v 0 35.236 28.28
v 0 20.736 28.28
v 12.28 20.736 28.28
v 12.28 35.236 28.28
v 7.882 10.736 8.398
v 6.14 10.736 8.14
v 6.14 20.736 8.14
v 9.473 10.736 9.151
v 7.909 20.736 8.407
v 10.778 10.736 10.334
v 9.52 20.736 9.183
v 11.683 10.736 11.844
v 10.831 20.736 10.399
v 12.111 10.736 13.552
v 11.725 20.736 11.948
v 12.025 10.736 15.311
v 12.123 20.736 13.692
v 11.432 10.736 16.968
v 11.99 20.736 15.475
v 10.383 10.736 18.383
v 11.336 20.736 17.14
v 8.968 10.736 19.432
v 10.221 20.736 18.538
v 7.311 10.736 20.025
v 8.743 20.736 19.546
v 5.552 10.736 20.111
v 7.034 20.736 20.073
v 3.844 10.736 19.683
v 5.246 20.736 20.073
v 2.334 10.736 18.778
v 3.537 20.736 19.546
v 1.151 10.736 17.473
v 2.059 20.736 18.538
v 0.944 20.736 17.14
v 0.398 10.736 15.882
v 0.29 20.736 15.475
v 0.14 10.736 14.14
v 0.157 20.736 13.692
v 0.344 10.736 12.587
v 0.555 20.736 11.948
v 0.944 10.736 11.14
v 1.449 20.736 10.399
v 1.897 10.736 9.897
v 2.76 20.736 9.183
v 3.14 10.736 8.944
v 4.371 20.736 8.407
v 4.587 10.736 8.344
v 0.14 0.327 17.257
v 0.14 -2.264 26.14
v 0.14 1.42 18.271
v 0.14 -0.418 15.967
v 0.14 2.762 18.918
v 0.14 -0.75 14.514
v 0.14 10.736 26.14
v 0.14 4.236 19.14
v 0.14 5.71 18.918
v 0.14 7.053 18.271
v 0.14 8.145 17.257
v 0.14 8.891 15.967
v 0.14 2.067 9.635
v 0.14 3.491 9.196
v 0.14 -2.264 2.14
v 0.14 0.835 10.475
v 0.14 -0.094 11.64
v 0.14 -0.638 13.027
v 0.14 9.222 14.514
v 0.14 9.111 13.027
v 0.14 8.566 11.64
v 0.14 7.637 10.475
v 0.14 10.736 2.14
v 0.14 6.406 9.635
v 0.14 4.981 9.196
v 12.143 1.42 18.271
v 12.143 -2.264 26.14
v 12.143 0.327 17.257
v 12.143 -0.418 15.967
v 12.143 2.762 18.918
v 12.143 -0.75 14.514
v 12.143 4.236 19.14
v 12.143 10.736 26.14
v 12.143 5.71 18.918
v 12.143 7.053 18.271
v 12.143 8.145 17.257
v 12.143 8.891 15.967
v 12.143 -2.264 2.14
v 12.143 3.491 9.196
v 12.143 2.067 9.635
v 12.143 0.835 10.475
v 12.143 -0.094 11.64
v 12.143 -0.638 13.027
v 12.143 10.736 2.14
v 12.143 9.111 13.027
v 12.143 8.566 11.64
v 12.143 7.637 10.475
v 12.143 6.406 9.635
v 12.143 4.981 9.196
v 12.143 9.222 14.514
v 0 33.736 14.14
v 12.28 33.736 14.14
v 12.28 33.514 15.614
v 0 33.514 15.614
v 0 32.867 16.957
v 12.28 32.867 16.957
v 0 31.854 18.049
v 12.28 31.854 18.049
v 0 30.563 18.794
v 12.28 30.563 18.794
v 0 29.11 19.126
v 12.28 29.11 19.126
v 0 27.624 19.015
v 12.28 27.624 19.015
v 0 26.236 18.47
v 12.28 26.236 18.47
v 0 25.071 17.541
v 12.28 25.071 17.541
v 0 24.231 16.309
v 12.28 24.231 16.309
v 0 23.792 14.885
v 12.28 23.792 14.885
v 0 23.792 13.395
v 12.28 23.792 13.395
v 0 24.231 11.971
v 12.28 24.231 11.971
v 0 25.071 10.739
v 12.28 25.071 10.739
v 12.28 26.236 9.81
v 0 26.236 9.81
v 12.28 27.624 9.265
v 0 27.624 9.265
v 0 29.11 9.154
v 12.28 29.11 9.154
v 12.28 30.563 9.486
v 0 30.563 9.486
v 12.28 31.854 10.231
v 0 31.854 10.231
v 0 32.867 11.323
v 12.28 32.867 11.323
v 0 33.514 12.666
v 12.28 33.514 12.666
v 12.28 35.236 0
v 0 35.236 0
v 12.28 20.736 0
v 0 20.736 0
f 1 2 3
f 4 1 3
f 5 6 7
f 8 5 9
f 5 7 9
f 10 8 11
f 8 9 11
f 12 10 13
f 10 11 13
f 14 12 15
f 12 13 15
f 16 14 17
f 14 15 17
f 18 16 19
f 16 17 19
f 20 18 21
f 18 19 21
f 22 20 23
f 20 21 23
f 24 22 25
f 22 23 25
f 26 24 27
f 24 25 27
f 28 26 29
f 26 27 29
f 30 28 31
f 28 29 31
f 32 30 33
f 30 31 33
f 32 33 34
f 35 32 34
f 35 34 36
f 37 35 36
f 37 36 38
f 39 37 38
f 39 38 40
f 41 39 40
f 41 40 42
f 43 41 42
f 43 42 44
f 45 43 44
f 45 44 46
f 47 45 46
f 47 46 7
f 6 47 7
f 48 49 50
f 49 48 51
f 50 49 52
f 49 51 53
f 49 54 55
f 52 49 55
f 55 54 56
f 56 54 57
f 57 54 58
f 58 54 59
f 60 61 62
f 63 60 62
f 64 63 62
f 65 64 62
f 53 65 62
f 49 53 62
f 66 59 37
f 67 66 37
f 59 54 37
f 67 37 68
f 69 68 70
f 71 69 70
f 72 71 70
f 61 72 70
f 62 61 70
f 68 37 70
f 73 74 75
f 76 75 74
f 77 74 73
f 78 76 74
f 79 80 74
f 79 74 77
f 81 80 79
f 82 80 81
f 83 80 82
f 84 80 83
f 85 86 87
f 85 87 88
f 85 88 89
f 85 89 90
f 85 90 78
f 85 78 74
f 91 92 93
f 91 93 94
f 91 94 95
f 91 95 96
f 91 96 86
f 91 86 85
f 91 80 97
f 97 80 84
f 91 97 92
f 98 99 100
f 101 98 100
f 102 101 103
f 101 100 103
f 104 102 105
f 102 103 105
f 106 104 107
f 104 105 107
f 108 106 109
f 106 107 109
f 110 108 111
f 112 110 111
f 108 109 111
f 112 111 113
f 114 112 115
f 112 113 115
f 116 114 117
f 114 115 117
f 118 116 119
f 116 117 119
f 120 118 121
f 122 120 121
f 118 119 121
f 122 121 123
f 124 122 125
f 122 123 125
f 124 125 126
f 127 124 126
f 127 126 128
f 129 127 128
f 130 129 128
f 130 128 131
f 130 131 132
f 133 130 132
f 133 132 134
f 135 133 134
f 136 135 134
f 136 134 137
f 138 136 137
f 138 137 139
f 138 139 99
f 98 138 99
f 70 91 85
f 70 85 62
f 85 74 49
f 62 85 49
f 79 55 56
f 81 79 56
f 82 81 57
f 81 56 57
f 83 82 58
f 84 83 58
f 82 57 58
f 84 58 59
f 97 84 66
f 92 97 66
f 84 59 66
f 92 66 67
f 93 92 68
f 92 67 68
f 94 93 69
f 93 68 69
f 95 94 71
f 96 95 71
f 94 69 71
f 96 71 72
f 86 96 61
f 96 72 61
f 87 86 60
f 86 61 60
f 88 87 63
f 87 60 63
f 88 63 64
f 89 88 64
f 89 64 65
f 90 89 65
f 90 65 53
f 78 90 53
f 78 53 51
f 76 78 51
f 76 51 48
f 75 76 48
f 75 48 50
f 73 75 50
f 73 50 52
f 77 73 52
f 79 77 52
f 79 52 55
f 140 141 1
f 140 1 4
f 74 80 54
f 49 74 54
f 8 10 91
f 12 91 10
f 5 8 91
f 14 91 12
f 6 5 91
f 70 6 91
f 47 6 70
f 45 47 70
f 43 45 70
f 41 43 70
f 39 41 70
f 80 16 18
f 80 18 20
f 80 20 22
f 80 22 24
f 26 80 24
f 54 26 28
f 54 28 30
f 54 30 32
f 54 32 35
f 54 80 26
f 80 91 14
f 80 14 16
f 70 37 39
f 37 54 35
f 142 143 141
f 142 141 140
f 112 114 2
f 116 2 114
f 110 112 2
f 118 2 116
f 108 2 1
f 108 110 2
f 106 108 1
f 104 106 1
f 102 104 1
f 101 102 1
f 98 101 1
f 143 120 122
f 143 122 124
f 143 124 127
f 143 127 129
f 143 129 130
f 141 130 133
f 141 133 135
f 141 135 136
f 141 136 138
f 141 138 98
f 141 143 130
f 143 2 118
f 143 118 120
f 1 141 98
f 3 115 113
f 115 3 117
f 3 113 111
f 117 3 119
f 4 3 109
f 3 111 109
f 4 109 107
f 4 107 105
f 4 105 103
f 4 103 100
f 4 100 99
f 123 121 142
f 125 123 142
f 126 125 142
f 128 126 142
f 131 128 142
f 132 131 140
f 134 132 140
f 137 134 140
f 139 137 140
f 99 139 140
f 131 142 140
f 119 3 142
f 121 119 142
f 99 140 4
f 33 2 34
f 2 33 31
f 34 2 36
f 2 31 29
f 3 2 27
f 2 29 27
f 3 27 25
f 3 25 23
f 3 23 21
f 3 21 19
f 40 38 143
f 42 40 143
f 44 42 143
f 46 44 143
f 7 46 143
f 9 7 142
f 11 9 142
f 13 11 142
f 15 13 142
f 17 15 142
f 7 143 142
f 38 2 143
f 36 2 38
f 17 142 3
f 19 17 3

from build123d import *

# Parameters (mm, degrees)
SKETCH1_W           = 12.28
SKETCH1_H           = 14.5
BOSS_EXTRUDE1_DEPTH = 28.28
SKETCH2_R           = 5
CUT_EXTRUDE1_DEPTH  = 28.27
SKETCH3_R           = 6
BOSS_EXTRUDE2_DEPTH = 10
SKETCH4_R           = 6
BOSS_EXTRUDE3_DEPTH = 13
SKETCH5_R           = 5
CUT_EXTRUDE2_DEPTH  = 13


with BuildPart() as part:
    # Sketch1 → Boss-Extrude1 (new body)
    with BuildSketch(Plane.XY):
        with Locations((6.14, 27.98627451)):
            Rectangle(SKETCH1_W, SKETCH1_H)
    extrude(amount=BOSS_EXTRUDE1_DEPTH)

    # Sketch2 → Cut-Extrude1 (cut)
    with BuildSketch(Plane(origin=(12.28, 0, 0), x_dir=(0, 0, -1), z_dir=(1, 0, 0))):
        with Locations(Location((-14.14, 28.73627451, 0), (0, 0, 90))):
            Circle(SKETCH2_R)
    extrude(amount=-CUT_EXTRUDE1_DEPTH, mode=Mode.SUBTRACT)

    # Sketch3 → Boss-Extrude2 (add)
    with BuildSketch(Plane.XZ.offset(-20.73627451)):
        with Locations(Location((6.14, 14.14, 0), (0, 0, 270))):
            Circle(SKETCH3_R)
    extrude(amount=BOSS_EXTRUDE2_DEPTH)

    # Sketch4 → Boss-Extrude3 (add)
    # profile 1 of 2: a face of its own
    with BuildSketch(Plane.XZ.offset(-10.73627451)):
        Polygon((0.14, 26.14), (2.09119792, 26.14), (12.143195084, 26.14), (12.143195084, 2.14), (0.14, 2.14), (0.14, 14.14), align=None)
        with Locations(Location((6.14, 14.14, 0), (0, 0, 180))):
            Circle(SKETCH4_R, mode=Mode.SUBTRACT)
    # profile 2 of 2: a face of its own
    with BuildSketch(Plane.XZ.offset(-10.73627451)):
        with Locations(Location((6.14, 14.14, 0), (0, 0, 180))):
            Circle(SKETCH4_R)
    extrude(amount=BOSS_EXTRUDE3_DEPTH)

    # Sketch5 → Cut-Extrude2 (cut)
    with BuildSketch(Plane.ZY.offset(-0.14)):
        with Locations((14.14, 4.23627451)):
            Circle(SKETCH5_R)
    extrude(amount=-CUT_EXTRUDE2_DEPTH, mode=Mode.SUBTRACT)


solid = part.part
